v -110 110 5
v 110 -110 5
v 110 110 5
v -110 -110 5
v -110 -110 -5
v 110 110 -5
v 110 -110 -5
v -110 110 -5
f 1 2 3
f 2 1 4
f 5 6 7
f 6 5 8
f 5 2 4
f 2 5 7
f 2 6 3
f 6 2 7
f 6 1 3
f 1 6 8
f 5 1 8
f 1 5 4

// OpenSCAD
// file: BOSL2/std.scad
// Minimal BOSL2 compatibility shim for bundled gallery models.
// It implements only the helpers used by the imported OpenSCAD projects.

CENTER = [0, 0, 0];
BOTTOM = [0, 0, -1];
TOP = [0, 0, 1];
LEFT = [-1, 0, 0];
RIGHT = [1, 0, 0];
FRONT = [0, -1, 0];
BACK = [0, 1, 0];

module up(z=0) {
    translate([0, 0, z]) children();
}

module down(z=0) {
    translate([0, 0, -z]) children();
}

module attach(anchor=CENTER) {
    children();
}

module cuboid(size=[1, 1, 1], anchor=CENTER) {
    center = anchor == CENTER;
    translate(center ? [0, 0, 0] : [0, 0, size[2] / 2])
        cube(size, center=true);
    children();
}

module xcyl(h=1, r=1, anchor=CENTER) {
    center = anchor == CENTER;
    translate(center ? [0, 0, 0] : [h / 2, 0, 0])
        rotate([0, 90, 0])
            cylinder(h=h, r=r, center=true);
}
// main file
include <BOSL2/std.scad>
$fn=100;
cuboid([ 220, 220, 10 ], rounding = 5, edges = [ TOP, FRONT + RIGHT, FRONT + LEFT, BACK + RIGHT, BACK + LEFT ]);
